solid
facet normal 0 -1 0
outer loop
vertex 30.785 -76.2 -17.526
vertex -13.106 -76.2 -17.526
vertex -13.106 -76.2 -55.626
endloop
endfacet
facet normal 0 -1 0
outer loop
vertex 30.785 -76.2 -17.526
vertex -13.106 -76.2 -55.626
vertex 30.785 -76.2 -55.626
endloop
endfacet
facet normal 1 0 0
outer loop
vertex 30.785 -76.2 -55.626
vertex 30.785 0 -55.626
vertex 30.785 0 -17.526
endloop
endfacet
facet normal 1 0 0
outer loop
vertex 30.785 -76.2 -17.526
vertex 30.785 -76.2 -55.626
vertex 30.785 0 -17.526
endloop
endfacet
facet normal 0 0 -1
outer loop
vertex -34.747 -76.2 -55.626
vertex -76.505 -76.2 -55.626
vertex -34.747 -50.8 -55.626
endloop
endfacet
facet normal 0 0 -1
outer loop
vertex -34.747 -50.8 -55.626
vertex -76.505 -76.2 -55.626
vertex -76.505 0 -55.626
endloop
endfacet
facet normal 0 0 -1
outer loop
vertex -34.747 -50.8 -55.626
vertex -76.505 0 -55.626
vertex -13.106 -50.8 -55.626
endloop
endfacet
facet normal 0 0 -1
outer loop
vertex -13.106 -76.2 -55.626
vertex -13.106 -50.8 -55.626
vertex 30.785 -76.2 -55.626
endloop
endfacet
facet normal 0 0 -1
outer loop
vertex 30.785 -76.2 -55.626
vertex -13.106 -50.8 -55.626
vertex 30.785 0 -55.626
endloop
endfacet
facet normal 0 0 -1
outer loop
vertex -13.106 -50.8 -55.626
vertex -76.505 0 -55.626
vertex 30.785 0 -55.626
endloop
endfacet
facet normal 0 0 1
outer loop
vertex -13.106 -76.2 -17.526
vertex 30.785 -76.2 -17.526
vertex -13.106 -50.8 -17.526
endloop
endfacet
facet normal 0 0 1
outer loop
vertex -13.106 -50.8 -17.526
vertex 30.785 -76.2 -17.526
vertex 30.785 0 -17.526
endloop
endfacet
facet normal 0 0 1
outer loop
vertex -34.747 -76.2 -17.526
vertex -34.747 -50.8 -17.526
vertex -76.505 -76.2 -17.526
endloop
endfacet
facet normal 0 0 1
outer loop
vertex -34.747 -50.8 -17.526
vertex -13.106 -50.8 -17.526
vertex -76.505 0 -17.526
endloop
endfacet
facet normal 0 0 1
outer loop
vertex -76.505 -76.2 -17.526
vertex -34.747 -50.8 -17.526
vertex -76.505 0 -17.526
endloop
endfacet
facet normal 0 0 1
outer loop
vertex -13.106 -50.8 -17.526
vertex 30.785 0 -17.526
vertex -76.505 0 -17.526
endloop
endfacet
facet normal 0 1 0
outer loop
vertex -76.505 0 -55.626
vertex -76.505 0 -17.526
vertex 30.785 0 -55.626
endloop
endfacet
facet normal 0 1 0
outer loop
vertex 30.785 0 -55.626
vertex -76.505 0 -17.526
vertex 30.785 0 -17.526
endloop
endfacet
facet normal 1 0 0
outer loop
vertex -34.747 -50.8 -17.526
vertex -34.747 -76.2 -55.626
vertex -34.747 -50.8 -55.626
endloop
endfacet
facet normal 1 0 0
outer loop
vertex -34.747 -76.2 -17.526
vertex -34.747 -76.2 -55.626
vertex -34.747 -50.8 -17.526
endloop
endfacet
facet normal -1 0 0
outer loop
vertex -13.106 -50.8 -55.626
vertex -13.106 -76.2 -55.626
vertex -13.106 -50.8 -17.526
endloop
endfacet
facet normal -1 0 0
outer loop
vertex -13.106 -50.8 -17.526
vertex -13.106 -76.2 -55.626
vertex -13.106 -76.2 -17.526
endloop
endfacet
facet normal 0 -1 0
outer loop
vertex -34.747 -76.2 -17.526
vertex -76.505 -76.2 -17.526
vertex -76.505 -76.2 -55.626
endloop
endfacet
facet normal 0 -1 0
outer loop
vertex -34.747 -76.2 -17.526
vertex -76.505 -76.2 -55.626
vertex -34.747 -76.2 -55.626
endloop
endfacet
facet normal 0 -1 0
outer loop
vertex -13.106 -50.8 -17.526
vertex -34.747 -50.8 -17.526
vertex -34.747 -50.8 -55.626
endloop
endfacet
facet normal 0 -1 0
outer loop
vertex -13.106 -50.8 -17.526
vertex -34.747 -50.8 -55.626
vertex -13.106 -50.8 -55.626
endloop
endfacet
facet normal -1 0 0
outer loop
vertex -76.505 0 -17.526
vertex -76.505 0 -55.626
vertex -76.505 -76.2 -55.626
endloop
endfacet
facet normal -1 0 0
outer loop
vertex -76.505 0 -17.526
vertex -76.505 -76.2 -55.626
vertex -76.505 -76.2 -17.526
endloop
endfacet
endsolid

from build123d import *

# Parameters (mm, degrees)
F0_W     = 40.843203
F0_H     = 38.1
F0_W_2   = 25.603201
F0_W_3   = 40.843199
F1_DEPTH = 76.2
F2_W     = 21.640803
F2_H     = 38.1
F3_DEPTH = 25.4


with BuildPart() as f1:
    # F0 (on Front) → F1 (new body)
    with BuildSketch(Plane.XZ):
        with Locations((-56.083202, -36.576001)):
            Rectangle(F0_W, F0_H)
        with Locations((-22.86, -36.576001)):
            Rectangle(F0_W_2, F0_H)
        with Locations((10.3632, -36.576001)):
            Rectangle(F0_W_3, F0_H)
    extrude(amount=F1_DEPTH)

    # F2 (on face) → F3 (cut)
    with BuildSketch(Plane.XZ.offset(76.2)):
        with Locations((-23.9268, -36.576001)):
            Rectangle(F2_W, F2_H)
    extrude(amount=-F3_DEPTH, mode=Mode.SUBTRACT)


solid = f1.part
